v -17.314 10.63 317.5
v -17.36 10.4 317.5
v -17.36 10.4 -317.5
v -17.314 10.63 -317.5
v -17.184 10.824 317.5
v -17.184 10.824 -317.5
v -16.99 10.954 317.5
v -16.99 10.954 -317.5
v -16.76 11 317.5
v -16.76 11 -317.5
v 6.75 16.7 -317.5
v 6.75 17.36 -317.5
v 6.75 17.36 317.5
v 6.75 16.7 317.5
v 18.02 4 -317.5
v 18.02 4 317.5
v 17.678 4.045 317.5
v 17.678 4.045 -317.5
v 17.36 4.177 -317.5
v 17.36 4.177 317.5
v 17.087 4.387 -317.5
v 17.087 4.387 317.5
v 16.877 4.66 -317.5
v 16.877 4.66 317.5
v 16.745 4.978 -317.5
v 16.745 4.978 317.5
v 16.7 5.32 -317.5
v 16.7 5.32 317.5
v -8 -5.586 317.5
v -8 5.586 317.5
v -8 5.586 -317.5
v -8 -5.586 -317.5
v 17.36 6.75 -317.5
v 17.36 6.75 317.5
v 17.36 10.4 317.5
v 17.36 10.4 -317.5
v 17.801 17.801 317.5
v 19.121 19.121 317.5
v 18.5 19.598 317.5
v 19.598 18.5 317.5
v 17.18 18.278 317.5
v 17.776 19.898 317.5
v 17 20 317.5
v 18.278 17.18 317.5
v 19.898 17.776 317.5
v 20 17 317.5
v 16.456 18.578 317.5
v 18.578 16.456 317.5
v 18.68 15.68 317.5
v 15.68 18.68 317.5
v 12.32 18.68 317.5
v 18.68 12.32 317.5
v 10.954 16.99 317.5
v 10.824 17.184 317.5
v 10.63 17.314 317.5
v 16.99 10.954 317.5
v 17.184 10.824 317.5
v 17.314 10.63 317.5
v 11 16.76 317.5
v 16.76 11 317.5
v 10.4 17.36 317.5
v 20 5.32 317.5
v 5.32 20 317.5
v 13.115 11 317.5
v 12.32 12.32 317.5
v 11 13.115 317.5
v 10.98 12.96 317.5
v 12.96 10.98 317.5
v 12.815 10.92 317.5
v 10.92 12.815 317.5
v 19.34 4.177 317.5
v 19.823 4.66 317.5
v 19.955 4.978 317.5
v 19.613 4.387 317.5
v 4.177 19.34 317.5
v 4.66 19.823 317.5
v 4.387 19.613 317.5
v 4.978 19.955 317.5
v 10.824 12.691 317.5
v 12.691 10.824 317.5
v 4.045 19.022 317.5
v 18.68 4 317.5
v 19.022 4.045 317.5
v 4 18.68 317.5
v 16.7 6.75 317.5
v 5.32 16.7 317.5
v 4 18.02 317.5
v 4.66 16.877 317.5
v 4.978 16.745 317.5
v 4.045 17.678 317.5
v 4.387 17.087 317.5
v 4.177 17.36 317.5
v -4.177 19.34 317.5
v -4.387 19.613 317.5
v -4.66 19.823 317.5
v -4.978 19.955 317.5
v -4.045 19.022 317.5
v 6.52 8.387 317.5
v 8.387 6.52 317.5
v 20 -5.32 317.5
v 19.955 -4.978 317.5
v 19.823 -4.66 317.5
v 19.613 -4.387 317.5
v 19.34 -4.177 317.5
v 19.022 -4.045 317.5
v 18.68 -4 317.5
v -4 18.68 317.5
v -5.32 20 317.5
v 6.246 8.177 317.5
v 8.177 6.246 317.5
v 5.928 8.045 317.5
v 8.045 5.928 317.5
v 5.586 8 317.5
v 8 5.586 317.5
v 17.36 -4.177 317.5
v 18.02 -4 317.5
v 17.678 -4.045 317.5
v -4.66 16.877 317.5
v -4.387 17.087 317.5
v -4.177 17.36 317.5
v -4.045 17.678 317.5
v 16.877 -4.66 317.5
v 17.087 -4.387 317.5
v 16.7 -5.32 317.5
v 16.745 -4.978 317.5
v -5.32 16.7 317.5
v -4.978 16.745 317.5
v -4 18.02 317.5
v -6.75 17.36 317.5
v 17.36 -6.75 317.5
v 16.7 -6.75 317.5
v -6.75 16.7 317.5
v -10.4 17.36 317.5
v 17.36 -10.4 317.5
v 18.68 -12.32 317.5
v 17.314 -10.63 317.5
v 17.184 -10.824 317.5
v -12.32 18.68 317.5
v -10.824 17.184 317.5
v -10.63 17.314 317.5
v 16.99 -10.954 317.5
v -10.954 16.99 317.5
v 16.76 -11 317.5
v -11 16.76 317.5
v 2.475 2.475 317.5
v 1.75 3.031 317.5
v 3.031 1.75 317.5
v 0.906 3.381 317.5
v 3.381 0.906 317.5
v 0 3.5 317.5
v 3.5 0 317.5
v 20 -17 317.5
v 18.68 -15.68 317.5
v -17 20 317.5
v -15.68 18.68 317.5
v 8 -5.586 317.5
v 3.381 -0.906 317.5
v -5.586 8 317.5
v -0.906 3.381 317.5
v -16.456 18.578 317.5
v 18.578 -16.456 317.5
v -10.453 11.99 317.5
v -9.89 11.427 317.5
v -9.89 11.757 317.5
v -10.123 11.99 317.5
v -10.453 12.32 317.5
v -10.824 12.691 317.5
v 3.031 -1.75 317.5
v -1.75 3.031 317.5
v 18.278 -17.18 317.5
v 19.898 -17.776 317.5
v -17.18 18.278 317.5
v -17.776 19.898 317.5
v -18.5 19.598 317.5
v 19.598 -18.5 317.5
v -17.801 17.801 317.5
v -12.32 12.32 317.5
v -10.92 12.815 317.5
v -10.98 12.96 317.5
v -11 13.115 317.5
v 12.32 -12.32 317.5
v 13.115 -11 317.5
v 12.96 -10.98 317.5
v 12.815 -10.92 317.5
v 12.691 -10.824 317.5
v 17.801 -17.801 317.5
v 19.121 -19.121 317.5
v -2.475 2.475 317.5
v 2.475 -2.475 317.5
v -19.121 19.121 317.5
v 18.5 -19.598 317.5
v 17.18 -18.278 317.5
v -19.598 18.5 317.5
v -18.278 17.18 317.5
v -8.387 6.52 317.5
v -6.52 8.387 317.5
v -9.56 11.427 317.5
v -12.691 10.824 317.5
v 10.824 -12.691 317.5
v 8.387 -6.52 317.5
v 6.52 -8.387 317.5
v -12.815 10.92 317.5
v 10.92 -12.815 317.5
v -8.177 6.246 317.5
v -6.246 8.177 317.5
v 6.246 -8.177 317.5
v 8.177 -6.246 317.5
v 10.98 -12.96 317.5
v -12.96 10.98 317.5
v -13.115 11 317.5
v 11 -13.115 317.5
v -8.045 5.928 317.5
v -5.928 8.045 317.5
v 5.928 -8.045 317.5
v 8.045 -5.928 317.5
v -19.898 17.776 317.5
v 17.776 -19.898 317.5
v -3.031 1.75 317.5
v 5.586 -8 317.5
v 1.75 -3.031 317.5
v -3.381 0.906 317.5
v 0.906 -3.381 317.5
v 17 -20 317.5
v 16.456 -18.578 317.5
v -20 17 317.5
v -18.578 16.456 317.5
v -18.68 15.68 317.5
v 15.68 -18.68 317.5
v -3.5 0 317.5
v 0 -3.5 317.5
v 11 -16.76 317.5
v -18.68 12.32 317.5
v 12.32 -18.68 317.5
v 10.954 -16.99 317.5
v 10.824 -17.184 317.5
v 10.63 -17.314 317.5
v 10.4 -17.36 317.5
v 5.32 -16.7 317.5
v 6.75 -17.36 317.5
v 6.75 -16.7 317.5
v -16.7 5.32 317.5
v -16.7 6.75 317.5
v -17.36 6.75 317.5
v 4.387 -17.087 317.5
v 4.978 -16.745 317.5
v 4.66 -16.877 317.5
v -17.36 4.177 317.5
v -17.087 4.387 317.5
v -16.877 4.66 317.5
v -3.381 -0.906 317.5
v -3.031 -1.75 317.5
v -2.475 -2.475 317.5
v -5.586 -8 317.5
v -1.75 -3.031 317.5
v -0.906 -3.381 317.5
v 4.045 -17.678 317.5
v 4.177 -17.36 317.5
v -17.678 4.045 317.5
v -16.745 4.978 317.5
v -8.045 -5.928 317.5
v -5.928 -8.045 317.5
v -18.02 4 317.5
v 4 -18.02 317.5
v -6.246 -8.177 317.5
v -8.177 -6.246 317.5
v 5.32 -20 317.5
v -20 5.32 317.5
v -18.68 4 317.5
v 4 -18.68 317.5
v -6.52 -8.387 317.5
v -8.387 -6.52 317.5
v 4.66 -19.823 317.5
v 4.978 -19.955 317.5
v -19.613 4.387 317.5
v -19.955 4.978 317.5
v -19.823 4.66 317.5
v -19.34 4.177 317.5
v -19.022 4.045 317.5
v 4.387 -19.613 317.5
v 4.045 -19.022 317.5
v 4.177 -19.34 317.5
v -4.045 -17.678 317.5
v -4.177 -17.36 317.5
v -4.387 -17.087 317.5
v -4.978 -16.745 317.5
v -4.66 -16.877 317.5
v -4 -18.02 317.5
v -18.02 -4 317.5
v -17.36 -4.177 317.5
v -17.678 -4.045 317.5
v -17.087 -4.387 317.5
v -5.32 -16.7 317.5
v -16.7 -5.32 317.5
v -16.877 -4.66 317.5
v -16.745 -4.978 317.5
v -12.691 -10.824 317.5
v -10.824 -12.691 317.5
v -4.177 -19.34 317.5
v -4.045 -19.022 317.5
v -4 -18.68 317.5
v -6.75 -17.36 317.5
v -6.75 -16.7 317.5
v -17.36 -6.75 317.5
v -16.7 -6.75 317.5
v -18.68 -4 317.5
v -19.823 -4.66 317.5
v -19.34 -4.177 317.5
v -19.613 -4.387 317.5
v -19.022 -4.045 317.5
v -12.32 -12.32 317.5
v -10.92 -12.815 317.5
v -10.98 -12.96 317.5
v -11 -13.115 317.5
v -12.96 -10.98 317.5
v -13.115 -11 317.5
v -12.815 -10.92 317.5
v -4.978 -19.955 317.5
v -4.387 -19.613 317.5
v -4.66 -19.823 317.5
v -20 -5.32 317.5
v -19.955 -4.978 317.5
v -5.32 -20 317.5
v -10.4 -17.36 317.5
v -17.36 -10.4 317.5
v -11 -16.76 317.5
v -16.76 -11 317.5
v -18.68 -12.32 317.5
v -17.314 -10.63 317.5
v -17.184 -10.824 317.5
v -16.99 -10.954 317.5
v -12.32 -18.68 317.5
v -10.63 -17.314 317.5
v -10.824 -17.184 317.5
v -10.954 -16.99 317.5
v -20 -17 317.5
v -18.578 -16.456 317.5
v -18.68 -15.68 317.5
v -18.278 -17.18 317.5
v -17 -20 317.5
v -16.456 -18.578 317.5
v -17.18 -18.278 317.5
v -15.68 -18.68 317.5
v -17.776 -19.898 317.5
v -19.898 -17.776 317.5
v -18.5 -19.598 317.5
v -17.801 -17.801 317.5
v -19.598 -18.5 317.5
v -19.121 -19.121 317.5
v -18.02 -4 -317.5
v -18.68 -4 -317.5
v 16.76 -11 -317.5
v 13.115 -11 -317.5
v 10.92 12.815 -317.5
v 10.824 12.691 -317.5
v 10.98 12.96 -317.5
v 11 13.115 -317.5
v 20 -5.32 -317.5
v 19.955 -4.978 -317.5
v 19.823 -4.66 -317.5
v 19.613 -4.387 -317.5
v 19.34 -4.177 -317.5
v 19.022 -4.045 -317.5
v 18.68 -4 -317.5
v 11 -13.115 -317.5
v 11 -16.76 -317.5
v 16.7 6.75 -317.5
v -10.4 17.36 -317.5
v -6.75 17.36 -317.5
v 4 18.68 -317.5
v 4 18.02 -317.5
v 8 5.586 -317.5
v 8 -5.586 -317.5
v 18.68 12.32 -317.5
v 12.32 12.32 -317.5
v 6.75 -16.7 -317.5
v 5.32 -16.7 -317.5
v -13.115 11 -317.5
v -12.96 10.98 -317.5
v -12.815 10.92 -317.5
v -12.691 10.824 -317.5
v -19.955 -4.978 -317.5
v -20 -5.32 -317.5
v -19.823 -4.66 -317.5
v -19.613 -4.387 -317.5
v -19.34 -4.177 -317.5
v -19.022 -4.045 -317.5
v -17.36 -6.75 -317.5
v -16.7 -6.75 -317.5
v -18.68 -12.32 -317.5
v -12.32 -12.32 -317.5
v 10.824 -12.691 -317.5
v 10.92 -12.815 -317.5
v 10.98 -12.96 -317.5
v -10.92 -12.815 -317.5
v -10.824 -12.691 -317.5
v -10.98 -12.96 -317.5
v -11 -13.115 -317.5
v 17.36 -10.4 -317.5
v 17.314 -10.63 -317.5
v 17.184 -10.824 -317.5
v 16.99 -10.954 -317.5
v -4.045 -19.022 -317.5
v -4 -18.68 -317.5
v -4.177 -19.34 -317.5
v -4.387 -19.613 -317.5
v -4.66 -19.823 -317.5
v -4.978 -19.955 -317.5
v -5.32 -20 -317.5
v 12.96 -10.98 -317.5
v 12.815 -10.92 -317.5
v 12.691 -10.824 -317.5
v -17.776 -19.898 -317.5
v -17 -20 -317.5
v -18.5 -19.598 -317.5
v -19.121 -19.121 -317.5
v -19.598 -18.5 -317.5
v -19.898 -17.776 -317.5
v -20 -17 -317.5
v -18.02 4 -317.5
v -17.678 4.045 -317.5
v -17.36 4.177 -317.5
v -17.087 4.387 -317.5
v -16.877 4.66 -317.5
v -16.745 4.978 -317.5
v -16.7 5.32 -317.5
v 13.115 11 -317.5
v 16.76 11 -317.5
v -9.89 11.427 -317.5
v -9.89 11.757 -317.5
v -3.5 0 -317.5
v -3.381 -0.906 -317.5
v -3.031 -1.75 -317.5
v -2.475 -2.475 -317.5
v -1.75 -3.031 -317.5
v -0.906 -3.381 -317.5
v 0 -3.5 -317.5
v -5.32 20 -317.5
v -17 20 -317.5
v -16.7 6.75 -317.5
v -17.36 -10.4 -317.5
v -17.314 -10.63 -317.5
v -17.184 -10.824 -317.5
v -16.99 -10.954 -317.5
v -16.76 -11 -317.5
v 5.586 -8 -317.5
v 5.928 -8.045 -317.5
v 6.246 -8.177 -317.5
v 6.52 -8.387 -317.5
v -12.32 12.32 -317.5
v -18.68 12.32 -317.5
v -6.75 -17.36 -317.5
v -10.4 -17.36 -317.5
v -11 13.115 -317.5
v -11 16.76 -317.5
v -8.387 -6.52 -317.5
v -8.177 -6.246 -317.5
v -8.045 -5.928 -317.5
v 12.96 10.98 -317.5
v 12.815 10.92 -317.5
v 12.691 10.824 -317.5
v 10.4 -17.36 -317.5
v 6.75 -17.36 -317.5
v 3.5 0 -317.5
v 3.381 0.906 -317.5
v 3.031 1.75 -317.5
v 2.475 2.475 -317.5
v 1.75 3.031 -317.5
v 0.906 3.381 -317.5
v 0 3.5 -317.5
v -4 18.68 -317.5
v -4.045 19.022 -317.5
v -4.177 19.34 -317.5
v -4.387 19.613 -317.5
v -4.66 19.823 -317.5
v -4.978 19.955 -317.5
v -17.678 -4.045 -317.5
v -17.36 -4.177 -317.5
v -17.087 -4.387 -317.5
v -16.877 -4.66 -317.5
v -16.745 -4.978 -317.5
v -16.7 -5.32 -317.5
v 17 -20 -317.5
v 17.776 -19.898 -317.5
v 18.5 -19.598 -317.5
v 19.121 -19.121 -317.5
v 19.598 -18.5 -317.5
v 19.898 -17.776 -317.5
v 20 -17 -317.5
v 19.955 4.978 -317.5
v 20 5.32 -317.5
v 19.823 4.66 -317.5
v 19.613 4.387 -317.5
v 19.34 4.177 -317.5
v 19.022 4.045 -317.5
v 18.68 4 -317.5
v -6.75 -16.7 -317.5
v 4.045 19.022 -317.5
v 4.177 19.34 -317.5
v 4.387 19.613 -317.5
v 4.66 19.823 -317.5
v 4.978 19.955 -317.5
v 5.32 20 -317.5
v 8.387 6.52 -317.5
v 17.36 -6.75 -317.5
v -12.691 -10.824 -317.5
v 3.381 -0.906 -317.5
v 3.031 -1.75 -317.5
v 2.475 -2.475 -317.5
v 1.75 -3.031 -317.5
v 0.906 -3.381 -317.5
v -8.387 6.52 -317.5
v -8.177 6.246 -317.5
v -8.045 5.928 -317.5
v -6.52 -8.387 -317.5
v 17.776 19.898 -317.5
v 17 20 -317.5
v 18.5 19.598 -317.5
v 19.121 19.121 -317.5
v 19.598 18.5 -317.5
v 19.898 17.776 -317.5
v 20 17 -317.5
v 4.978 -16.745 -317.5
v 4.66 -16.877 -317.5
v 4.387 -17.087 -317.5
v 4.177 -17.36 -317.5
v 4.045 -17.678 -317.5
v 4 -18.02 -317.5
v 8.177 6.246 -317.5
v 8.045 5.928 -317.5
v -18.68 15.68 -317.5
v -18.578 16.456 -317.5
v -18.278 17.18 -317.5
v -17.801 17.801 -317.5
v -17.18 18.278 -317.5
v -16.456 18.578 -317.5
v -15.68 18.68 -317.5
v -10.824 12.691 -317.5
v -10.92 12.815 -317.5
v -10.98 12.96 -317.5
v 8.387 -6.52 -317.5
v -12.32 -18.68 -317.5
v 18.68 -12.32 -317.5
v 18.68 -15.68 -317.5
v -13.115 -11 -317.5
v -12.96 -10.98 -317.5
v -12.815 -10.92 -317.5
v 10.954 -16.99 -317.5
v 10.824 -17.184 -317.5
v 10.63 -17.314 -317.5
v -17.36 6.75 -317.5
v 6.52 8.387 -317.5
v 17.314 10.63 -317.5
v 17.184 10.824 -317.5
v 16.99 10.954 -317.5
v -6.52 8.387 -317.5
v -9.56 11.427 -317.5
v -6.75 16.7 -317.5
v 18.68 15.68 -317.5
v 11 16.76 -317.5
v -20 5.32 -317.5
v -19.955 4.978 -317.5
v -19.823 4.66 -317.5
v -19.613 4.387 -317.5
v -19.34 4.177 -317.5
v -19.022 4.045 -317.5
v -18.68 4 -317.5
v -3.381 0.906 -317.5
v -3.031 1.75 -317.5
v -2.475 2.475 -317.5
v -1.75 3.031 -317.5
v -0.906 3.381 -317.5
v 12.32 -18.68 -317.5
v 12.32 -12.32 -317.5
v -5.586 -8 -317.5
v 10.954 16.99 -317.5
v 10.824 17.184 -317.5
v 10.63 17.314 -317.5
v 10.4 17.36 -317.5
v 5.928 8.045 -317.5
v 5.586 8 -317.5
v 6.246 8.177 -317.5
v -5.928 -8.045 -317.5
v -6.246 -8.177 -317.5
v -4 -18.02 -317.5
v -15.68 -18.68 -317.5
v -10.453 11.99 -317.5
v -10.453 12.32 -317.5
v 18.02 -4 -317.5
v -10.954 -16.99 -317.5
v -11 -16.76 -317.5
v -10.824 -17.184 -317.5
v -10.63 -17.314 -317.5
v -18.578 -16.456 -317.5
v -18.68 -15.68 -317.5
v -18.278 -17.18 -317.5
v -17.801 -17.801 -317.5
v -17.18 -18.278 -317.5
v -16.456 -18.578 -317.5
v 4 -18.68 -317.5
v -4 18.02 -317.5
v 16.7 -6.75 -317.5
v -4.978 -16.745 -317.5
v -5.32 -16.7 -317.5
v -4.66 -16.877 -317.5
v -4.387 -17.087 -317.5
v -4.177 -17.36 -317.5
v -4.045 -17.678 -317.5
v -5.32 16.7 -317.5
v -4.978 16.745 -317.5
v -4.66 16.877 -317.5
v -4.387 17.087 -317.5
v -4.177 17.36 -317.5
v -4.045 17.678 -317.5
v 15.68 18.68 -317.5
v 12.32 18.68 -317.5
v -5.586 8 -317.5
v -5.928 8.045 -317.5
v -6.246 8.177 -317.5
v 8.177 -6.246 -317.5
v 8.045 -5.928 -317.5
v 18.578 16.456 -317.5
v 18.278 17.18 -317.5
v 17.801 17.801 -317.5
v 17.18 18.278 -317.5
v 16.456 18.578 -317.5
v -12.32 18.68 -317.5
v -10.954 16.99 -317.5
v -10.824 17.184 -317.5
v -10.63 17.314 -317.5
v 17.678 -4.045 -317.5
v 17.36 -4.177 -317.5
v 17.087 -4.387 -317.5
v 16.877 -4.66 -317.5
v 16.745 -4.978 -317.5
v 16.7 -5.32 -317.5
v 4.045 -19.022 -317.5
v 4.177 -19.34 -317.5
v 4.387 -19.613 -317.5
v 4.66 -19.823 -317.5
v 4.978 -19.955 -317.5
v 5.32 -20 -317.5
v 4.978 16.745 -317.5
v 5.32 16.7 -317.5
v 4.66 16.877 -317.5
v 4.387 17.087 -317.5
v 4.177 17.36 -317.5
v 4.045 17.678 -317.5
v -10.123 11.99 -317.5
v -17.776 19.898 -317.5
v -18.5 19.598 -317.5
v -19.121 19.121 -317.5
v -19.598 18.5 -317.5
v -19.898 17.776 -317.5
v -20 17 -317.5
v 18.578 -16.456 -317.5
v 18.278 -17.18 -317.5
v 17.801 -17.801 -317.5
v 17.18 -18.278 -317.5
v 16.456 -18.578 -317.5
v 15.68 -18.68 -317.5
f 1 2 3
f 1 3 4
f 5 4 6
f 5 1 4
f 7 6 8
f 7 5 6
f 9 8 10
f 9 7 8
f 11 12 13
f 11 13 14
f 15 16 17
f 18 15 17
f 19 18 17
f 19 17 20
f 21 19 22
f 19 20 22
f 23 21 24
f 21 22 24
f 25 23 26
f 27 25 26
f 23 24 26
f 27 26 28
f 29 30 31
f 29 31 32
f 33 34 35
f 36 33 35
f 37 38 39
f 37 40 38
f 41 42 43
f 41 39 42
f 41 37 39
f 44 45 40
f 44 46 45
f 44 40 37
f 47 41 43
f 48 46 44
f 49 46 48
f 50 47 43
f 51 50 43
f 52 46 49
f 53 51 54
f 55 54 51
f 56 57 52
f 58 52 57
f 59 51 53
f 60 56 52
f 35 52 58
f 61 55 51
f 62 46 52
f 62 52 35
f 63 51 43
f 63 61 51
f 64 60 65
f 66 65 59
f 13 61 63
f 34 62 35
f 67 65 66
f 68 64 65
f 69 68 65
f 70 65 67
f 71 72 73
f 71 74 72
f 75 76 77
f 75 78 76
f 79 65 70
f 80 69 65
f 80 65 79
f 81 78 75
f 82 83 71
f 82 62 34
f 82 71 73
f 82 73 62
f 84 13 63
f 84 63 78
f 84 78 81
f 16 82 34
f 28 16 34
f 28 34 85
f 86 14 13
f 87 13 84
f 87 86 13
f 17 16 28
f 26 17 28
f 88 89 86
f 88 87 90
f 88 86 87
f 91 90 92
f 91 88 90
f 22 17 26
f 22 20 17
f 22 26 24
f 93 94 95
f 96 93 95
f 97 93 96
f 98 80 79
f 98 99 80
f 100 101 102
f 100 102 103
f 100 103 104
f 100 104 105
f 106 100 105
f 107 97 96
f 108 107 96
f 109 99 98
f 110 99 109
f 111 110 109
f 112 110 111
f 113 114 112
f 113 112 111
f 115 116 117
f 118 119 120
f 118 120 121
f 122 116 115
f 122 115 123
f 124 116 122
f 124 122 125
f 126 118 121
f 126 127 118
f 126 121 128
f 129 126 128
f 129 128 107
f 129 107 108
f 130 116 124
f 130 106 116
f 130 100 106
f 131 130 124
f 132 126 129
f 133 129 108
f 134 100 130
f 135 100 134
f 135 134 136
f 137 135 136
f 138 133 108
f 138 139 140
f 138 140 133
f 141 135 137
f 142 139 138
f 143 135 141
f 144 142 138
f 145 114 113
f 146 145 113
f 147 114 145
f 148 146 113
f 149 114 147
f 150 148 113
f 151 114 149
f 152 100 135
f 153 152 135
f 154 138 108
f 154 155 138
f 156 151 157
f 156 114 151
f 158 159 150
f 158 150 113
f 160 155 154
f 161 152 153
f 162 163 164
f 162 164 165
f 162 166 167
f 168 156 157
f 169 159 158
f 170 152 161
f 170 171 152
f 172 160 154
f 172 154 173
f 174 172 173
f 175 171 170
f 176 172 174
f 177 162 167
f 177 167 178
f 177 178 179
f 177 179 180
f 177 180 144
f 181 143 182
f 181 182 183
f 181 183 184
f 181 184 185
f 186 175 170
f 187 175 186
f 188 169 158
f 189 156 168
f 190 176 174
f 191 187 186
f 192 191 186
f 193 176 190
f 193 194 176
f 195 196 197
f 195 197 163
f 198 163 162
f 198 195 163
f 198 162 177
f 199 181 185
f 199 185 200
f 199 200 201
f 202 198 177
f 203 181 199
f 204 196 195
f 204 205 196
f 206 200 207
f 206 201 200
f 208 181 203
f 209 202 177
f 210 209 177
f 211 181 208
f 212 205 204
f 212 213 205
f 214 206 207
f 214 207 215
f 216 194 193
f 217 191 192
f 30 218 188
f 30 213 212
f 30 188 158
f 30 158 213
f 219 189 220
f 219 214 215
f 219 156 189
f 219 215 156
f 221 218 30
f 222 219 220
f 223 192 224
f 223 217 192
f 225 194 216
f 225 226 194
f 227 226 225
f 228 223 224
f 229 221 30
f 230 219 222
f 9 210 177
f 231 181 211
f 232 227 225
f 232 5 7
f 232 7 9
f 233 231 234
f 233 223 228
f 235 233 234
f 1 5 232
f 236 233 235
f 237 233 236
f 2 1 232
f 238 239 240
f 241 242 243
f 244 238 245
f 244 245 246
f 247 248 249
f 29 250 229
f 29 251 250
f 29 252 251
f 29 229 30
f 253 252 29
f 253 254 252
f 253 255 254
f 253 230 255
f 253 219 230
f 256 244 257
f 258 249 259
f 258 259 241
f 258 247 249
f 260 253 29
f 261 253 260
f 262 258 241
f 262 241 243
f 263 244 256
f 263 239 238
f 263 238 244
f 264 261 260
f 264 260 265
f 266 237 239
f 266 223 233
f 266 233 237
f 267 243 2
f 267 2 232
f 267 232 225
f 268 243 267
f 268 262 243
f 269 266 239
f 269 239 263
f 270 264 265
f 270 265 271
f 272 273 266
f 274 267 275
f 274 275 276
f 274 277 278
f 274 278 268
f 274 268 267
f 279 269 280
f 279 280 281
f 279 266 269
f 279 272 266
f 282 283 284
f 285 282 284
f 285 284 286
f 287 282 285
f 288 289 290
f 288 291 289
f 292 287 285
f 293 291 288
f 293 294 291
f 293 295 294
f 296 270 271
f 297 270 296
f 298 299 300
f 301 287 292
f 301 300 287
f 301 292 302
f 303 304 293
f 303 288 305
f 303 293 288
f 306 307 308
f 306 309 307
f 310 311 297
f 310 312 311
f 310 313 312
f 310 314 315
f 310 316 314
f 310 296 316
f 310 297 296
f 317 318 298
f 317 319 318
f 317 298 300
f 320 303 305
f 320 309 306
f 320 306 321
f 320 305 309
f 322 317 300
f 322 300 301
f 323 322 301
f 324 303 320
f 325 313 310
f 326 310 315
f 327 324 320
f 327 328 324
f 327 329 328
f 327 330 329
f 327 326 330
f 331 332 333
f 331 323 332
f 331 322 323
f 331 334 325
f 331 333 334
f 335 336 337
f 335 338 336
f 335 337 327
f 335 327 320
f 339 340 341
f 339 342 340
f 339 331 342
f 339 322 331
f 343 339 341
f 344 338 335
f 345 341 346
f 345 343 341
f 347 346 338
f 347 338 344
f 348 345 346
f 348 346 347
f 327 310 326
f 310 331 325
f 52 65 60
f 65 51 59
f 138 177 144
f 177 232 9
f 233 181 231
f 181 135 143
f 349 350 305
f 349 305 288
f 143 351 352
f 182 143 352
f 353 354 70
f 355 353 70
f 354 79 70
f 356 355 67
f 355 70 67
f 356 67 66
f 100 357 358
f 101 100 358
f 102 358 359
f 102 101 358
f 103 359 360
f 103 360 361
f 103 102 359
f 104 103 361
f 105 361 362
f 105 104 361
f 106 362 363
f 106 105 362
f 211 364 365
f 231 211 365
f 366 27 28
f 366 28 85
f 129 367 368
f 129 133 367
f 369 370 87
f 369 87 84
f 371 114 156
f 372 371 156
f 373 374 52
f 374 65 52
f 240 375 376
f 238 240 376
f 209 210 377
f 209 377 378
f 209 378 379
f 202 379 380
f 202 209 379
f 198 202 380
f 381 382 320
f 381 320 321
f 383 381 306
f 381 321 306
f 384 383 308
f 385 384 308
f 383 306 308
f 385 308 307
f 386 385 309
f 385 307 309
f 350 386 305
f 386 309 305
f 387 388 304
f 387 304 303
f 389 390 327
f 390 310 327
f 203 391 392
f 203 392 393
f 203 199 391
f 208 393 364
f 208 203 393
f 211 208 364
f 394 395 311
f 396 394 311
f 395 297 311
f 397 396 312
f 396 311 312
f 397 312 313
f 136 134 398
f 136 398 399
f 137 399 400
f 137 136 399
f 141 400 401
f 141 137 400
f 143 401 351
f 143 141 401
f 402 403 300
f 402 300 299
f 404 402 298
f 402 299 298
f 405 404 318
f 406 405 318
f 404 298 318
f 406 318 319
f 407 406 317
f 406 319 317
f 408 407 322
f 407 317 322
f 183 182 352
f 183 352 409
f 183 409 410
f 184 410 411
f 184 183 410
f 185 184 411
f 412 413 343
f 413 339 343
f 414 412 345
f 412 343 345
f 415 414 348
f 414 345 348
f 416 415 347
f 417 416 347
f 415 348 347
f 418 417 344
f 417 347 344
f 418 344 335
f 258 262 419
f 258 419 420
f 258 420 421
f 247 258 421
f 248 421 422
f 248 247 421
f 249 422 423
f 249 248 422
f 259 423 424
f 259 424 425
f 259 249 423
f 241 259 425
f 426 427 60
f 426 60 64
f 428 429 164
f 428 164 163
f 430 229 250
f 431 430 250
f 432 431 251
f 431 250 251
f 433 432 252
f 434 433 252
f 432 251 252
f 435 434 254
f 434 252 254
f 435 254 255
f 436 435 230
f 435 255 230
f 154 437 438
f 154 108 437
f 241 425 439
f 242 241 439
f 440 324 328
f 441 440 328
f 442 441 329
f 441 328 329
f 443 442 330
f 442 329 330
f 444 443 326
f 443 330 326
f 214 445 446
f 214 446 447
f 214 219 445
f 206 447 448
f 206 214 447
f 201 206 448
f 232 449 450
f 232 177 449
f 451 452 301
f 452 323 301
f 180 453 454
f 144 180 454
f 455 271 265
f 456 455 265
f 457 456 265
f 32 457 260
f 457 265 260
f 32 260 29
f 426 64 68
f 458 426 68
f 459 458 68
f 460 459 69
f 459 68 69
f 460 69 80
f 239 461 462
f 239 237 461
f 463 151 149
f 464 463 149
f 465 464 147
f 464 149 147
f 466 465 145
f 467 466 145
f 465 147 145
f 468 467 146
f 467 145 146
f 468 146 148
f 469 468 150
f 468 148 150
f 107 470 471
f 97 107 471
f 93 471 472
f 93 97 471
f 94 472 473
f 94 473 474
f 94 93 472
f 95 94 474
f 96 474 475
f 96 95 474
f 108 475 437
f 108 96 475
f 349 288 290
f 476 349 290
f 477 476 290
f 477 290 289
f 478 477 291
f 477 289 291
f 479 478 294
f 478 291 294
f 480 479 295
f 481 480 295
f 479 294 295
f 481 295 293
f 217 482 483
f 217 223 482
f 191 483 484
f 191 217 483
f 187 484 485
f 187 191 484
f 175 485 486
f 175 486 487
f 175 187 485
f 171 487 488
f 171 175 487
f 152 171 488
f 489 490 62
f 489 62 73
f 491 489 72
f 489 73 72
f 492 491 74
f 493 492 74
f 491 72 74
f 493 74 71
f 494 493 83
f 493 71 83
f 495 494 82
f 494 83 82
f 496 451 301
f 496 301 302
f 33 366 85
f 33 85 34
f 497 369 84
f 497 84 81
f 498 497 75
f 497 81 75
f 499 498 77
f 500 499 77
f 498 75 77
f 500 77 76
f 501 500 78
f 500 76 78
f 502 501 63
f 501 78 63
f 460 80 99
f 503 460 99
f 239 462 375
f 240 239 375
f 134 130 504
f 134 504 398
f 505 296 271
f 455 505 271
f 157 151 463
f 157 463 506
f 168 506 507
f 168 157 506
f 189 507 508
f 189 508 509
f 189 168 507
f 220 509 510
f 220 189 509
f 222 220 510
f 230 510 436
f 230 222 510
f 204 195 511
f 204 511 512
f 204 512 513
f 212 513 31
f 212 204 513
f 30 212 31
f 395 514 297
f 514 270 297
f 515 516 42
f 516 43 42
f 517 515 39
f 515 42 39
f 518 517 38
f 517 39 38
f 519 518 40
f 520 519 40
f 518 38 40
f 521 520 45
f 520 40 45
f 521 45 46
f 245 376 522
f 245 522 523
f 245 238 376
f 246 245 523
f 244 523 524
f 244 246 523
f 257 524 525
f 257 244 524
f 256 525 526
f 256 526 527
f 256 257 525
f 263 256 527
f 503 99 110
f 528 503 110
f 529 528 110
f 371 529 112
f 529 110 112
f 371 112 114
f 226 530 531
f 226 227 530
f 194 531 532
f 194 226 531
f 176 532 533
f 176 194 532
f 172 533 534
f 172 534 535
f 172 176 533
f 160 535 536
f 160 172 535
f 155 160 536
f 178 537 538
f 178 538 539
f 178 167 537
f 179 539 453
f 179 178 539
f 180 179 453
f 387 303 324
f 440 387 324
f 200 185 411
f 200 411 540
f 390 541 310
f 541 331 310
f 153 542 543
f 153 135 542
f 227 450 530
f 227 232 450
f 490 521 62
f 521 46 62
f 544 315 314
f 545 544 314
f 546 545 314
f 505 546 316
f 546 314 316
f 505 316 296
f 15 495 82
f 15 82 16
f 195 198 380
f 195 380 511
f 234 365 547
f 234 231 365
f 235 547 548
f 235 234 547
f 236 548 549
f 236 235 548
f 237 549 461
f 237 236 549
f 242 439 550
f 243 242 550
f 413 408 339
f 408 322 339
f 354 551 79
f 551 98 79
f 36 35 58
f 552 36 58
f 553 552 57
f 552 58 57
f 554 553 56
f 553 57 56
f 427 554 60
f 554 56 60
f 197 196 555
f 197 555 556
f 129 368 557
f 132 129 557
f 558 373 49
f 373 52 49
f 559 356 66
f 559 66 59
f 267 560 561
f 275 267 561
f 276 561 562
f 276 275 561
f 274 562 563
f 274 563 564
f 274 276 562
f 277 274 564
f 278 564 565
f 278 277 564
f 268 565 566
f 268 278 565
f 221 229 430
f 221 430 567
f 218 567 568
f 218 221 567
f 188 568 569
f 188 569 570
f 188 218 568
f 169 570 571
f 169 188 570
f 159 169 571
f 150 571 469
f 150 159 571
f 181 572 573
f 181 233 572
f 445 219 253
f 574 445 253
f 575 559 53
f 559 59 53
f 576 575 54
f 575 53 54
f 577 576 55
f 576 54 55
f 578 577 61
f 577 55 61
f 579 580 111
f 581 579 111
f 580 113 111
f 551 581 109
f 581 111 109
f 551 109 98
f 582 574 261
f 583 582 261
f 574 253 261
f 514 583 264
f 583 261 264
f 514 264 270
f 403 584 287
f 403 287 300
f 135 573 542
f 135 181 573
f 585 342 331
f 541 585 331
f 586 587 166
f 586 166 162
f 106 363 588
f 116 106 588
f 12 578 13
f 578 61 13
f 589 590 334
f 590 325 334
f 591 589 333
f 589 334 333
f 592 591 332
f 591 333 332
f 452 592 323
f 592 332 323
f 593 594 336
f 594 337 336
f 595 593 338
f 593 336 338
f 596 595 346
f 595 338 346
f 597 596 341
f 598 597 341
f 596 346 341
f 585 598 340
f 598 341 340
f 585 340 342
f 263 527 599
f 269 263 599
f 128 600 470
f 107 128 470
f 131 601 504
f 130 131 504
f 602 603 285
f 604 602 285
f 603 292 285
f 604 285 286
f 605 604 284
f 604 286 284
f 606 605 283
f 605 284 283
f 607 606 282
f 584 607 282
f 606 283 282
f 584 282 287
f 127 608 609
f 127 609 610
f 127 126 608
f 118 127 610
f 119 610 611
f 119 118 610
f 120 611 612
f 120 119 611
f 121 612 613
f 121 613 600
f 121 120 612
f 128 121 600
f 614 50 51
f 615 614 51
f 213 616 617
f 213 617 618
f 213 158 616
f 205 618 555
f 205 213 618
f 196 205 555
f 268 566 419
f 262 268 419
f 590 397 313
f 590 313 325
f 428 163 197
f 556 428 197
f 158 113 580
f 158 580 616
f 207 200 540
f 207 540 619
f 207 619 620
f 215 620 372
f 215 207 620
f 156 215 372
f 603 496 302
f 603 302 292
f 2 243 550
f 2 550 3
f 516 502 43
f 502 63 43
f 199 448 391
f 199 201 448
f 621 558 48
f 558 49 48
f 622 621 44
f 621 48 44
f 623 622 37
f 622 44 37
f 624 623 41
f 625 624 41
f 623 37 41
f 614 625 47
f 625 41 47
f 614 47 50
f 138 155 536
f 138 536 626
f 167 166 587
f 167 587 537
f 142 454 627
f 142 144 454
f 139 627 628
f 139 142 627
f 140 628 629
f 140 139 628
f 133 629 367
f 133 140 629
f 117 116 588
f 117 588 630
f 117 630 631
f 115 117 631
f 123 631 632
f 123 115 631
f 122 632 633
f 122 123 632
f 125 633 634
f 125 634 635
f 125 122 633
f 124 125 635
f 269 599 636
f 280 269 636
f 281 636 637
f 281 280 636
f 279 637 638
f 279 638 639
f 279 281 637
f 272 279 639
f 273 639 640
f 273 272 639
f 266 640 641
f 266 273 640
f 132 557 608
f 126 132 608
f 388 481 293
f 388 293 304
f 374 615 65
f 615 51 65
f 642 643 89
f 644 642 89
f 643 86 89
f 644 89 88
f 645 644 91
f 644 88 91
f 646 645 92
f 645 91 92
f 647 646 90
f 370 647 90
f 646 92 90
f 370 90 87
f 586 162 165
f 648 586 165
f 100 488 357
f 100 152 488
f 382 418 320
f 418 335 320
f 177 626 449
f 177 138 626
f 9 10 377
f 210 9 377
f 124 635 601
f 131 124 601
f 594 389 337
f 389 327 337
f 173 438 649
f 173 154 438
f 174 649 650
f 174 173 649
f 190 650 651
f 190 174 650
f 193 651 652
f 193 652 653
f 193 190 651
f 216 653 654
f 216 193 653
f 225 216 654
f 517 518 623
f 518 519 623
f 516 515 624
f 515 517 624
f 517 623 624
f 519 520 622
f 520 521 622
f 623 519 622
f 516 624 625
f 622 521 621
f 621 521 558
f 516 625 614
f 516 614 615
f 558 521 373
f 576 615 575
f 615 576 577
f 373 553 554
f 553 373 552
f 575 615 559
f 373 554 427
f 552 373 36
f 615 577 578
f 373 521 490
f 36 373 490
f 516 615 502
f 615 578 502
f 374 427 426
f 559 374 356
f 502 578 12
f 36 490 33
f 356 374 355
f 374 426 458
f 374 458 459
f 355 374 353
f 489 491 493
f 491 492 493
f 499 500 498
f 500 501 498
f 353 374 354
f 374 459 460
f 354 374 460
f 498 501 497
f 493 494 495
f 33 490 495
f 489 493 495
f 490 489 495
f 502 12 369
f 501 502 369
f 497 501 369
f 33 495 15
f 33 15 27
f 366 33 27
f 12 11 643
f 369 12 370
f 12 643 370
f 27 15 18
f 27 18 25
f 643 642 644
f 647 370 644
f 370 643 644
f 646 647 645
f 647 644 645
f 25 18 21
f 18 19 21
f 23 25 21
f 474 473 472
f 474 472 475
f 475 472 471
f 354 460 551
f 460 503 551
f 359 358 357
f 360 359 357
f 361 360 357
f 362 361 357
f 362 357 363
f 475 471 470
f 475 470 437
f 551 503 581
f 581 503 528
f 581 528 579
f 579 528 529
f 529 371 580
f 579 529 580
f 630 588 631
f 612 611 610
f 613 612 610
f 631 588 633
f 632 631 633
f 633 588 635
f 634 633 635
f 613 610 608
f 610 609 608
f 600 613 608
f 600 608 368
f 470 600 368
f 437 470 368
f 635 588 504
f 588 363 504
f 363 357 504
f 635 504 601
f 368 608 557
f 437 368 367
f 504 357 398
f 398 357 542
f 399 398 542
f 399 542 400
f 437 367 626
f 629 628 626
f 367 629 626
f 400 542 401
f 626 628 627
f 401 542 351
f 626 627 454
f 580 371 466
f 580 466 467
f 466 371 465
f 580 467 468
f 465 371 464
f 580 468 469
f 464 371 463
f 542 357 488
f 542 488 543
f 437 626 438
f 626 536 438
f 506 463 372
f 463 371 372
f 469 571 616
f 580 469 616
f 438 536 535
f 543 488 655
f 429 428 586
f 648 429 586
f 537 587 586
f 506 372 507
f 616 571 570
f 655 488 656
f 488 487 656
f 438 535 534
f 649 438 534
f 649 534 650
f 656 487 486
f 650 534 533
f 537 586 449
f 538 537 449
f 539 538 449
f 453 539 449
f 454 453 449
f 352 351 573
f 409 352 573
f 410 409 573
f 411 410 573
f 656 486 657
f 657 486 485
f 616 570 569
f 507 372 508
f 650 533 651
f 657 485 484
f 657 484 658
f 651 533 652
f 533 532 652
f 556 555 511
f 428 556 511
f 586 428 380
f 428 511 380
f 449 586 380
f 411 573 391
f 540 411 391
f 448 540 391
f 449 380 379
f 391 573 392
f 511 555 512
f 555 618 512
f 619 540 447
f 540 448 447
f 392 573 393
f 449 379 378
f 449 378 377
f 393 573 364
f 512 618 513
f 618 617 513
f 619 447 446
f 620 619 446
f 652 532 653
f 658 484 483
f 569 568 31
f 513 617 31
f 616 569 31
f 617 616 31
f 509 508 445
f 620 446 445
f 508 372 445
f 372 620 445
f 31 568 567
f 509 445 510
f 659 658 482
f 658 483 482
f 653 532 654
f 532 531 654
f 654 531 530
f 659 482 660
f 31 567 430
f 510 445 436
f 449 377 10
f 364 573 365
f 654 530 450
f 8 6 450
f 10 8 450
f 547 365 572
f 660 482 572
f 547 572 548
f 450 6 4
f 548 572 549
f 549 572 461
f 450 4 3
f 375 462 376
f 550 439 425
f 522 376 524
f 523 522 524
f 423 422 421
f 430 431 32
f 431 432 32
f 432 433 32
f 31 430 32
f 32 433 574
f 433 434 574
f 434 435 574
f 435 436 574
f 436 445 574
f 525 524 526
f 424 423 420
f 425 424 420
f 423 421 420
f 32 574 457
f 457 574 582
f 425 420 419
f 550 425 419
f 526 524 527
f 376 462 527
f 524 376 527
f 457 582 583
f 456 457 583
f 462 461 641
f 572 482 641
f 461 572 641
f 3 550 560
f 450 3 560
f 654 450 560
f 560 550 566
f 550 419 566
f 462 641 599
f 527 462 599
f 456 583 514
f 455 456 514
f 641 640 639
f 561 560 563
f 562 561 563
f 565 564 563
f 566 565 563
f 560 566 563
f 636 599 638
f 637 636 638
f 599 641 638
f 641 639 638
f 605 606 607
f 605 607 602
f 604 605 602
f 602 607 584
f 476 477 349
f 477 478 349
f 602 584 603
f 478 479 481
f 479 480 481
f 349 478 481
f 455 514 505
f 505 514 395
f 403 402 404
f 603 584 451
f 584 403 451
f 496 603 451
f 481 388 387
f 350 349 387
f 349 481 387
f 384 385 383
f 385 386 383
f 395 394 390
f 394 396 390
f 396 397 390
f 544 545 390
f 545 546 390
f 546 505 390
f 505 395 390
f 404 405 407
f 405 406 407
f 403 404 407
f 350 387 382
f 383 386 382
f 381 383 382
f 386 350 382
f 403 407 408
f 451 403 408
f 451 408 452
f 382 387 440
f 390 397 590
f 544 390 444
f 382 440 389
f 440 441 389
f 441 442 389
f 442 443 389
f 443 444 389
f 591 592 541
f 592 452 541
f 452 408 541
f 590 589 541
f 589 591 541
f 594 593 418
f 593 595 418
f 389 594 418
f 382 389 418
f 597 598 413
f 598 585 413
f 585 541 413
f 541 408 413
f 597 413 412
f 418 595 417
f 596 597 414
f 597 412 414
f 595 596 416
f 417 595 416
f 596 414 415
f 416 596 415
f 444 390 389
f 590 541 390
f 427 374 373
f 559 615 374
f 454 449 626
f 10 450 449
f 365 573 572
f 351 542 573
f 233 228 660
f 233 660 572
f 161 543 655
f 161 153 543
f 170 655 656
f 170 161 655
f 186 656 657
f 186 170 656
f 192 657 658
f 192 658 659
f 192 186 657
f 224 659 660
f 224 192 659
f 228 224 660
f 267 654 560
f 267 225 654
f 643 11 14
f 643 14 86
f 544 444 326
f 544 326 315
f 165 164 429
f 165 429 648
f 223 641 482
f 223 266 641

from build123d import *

# Parameters (mm, degrees)
BOSS_EXTRUDE1_DEPTH     = 317.5
CUT_EXTRUDE1_DEPTH      = 319.757352856
CUT_EXTRUDE1_DEPTH_BACK = 319.757352856


with BuildPart() as part:
    # Sketch4 → Boss-Extrude1 (new, symmetric)
    with BuildSketch(Plane.XY):
        with BuildLine():
            Line((20, -17), (20, -5.32))
            ThreePointArc((20, -5.32), (19.613380951, -4.386619049), (18.68, -4))
            Line((18.68, -4), (18.02, -4))
            ThreePointArc((18.02, -4), (17.086619049, -4.386619049), (16.7, -5.32))
            Line((16.7, -5.32), (16.7, -6.75))
            Line((16.7, -6.75), (17.36, -6.75))
            Line((17.36, -6.75), (17.36, -10.4))
            ThreePointArc((17.36, -10.4), (17.184264069, -10.824264069), (16.76, -11))
            Line((16.76, -11), (13.11529004, -11))
            ThreePointArc((13.11529004, -11), (12.88567998, -10.95432772), (12.691025971, -10.824264069))
            Line((12.691025971, -10.824264069), (8.386619049, -6.519857147))
            ThreePointArc((8.386619049, -6.519857147), (8.100479017, -6.091618326), (8, -5.586476195))
            Line((8, -5.586476195), (8, 0))
            Line((8, 0), (3.5, 0))
            ThreePointArc((3.5, 0), (2.474873734, -2.474873734), (0, -3.5))
            Line((0, -3.5), (0, -8))
            Line((0, -8), (5.586476195, -8))
            ThreePointArc((5.586476195, -8), (6.091618326, -8.100479017), (6.519857147, -8.386619049))
            Line((6.519857147, -8.386619049), (10.824264069, -12.691025971))
            ThreePointArc((10.824264069, -12.691025971), (10.95432772, -12.88567998), (11, -13.11529004))
            Line((11, -13.11529004), (11, -16.76))
            ThreePointArc((11, -16.76), (10.824264069, -17.184264069), (10.4, -17.36))
            Line((10.4, -17.36), (6.75, -17.36))
            Line((6.75, -17.36), (6.75, -16.7))
            Line((6.75, -16.7), (5.32, -16.7))
            ThreePointArc((5.32, -16.7), (4.386619049, -17.086619049), (4, -18.02))
            Line((4, -18.02), (4, -18.68))
            ThreePointArc((4, -18.68), (4.386619049, -19.613380951), (5.32, -20))
            Line((5.32, -20), (17, -20))
            ThreePointArc((17, -20), (19.121320344, -19.121320344), (20, -17))
        make_face()
        with BuildLine():
            Line((15.68, -18.68), (12.32, -18.68))
            Line((12.32, -18.68), (12.32, -12.32))
            Line((12.32, -12.32), (18.68, -12.32))
            Line((18.68, -12.32), (18.68, -15.68))
            ThreePointArc((18.68, -15.68), (17.801320344, -17.801320344), (15.68, -18.68))
        make_face(mode=Mode.SUBTRACT)
    extrude(amount=BOSS_EXTRUDE1_DEPTH, both=True)

    # Mirror1: part across plane


with BuildPart() as part_1:
    add(part.part)
    add(part.part.mirror(Plane(origin=(0, 0, 0), x_dir=(0, 0, 1), z_dir=(1, 0, 0))))

    # Mirror2: part across plane


with BuildPart() as part_2:
    add(part_1.part)
    add(part_1.part.mirror(Plane.ZX))

    # Sketch5 → Cut-Extrude1 (cut, two sides: drawn at the far end of the back side and taken through both)
    with BuildSketch(Plane.XY.offset(-CUT_EXTRUDE1_DEPTH_BACK)):
        Polygon((-10.453238098, 12.32), (-10.453238098, 11.99), (-10.123238098, 11.99), (-9.88989286, 11.756654762), (-9.88989286, 11.426654762), (-9.55989286, 11.426654762), (-9.55989286, 12.32), align=None)
    extrude(amount=CUT_EXTRUDE1_DEPTH + CUT_EXTRUDE1_DEPTH_BACK, mode=Mode.SUBTRACT)


solid = part_2.part
